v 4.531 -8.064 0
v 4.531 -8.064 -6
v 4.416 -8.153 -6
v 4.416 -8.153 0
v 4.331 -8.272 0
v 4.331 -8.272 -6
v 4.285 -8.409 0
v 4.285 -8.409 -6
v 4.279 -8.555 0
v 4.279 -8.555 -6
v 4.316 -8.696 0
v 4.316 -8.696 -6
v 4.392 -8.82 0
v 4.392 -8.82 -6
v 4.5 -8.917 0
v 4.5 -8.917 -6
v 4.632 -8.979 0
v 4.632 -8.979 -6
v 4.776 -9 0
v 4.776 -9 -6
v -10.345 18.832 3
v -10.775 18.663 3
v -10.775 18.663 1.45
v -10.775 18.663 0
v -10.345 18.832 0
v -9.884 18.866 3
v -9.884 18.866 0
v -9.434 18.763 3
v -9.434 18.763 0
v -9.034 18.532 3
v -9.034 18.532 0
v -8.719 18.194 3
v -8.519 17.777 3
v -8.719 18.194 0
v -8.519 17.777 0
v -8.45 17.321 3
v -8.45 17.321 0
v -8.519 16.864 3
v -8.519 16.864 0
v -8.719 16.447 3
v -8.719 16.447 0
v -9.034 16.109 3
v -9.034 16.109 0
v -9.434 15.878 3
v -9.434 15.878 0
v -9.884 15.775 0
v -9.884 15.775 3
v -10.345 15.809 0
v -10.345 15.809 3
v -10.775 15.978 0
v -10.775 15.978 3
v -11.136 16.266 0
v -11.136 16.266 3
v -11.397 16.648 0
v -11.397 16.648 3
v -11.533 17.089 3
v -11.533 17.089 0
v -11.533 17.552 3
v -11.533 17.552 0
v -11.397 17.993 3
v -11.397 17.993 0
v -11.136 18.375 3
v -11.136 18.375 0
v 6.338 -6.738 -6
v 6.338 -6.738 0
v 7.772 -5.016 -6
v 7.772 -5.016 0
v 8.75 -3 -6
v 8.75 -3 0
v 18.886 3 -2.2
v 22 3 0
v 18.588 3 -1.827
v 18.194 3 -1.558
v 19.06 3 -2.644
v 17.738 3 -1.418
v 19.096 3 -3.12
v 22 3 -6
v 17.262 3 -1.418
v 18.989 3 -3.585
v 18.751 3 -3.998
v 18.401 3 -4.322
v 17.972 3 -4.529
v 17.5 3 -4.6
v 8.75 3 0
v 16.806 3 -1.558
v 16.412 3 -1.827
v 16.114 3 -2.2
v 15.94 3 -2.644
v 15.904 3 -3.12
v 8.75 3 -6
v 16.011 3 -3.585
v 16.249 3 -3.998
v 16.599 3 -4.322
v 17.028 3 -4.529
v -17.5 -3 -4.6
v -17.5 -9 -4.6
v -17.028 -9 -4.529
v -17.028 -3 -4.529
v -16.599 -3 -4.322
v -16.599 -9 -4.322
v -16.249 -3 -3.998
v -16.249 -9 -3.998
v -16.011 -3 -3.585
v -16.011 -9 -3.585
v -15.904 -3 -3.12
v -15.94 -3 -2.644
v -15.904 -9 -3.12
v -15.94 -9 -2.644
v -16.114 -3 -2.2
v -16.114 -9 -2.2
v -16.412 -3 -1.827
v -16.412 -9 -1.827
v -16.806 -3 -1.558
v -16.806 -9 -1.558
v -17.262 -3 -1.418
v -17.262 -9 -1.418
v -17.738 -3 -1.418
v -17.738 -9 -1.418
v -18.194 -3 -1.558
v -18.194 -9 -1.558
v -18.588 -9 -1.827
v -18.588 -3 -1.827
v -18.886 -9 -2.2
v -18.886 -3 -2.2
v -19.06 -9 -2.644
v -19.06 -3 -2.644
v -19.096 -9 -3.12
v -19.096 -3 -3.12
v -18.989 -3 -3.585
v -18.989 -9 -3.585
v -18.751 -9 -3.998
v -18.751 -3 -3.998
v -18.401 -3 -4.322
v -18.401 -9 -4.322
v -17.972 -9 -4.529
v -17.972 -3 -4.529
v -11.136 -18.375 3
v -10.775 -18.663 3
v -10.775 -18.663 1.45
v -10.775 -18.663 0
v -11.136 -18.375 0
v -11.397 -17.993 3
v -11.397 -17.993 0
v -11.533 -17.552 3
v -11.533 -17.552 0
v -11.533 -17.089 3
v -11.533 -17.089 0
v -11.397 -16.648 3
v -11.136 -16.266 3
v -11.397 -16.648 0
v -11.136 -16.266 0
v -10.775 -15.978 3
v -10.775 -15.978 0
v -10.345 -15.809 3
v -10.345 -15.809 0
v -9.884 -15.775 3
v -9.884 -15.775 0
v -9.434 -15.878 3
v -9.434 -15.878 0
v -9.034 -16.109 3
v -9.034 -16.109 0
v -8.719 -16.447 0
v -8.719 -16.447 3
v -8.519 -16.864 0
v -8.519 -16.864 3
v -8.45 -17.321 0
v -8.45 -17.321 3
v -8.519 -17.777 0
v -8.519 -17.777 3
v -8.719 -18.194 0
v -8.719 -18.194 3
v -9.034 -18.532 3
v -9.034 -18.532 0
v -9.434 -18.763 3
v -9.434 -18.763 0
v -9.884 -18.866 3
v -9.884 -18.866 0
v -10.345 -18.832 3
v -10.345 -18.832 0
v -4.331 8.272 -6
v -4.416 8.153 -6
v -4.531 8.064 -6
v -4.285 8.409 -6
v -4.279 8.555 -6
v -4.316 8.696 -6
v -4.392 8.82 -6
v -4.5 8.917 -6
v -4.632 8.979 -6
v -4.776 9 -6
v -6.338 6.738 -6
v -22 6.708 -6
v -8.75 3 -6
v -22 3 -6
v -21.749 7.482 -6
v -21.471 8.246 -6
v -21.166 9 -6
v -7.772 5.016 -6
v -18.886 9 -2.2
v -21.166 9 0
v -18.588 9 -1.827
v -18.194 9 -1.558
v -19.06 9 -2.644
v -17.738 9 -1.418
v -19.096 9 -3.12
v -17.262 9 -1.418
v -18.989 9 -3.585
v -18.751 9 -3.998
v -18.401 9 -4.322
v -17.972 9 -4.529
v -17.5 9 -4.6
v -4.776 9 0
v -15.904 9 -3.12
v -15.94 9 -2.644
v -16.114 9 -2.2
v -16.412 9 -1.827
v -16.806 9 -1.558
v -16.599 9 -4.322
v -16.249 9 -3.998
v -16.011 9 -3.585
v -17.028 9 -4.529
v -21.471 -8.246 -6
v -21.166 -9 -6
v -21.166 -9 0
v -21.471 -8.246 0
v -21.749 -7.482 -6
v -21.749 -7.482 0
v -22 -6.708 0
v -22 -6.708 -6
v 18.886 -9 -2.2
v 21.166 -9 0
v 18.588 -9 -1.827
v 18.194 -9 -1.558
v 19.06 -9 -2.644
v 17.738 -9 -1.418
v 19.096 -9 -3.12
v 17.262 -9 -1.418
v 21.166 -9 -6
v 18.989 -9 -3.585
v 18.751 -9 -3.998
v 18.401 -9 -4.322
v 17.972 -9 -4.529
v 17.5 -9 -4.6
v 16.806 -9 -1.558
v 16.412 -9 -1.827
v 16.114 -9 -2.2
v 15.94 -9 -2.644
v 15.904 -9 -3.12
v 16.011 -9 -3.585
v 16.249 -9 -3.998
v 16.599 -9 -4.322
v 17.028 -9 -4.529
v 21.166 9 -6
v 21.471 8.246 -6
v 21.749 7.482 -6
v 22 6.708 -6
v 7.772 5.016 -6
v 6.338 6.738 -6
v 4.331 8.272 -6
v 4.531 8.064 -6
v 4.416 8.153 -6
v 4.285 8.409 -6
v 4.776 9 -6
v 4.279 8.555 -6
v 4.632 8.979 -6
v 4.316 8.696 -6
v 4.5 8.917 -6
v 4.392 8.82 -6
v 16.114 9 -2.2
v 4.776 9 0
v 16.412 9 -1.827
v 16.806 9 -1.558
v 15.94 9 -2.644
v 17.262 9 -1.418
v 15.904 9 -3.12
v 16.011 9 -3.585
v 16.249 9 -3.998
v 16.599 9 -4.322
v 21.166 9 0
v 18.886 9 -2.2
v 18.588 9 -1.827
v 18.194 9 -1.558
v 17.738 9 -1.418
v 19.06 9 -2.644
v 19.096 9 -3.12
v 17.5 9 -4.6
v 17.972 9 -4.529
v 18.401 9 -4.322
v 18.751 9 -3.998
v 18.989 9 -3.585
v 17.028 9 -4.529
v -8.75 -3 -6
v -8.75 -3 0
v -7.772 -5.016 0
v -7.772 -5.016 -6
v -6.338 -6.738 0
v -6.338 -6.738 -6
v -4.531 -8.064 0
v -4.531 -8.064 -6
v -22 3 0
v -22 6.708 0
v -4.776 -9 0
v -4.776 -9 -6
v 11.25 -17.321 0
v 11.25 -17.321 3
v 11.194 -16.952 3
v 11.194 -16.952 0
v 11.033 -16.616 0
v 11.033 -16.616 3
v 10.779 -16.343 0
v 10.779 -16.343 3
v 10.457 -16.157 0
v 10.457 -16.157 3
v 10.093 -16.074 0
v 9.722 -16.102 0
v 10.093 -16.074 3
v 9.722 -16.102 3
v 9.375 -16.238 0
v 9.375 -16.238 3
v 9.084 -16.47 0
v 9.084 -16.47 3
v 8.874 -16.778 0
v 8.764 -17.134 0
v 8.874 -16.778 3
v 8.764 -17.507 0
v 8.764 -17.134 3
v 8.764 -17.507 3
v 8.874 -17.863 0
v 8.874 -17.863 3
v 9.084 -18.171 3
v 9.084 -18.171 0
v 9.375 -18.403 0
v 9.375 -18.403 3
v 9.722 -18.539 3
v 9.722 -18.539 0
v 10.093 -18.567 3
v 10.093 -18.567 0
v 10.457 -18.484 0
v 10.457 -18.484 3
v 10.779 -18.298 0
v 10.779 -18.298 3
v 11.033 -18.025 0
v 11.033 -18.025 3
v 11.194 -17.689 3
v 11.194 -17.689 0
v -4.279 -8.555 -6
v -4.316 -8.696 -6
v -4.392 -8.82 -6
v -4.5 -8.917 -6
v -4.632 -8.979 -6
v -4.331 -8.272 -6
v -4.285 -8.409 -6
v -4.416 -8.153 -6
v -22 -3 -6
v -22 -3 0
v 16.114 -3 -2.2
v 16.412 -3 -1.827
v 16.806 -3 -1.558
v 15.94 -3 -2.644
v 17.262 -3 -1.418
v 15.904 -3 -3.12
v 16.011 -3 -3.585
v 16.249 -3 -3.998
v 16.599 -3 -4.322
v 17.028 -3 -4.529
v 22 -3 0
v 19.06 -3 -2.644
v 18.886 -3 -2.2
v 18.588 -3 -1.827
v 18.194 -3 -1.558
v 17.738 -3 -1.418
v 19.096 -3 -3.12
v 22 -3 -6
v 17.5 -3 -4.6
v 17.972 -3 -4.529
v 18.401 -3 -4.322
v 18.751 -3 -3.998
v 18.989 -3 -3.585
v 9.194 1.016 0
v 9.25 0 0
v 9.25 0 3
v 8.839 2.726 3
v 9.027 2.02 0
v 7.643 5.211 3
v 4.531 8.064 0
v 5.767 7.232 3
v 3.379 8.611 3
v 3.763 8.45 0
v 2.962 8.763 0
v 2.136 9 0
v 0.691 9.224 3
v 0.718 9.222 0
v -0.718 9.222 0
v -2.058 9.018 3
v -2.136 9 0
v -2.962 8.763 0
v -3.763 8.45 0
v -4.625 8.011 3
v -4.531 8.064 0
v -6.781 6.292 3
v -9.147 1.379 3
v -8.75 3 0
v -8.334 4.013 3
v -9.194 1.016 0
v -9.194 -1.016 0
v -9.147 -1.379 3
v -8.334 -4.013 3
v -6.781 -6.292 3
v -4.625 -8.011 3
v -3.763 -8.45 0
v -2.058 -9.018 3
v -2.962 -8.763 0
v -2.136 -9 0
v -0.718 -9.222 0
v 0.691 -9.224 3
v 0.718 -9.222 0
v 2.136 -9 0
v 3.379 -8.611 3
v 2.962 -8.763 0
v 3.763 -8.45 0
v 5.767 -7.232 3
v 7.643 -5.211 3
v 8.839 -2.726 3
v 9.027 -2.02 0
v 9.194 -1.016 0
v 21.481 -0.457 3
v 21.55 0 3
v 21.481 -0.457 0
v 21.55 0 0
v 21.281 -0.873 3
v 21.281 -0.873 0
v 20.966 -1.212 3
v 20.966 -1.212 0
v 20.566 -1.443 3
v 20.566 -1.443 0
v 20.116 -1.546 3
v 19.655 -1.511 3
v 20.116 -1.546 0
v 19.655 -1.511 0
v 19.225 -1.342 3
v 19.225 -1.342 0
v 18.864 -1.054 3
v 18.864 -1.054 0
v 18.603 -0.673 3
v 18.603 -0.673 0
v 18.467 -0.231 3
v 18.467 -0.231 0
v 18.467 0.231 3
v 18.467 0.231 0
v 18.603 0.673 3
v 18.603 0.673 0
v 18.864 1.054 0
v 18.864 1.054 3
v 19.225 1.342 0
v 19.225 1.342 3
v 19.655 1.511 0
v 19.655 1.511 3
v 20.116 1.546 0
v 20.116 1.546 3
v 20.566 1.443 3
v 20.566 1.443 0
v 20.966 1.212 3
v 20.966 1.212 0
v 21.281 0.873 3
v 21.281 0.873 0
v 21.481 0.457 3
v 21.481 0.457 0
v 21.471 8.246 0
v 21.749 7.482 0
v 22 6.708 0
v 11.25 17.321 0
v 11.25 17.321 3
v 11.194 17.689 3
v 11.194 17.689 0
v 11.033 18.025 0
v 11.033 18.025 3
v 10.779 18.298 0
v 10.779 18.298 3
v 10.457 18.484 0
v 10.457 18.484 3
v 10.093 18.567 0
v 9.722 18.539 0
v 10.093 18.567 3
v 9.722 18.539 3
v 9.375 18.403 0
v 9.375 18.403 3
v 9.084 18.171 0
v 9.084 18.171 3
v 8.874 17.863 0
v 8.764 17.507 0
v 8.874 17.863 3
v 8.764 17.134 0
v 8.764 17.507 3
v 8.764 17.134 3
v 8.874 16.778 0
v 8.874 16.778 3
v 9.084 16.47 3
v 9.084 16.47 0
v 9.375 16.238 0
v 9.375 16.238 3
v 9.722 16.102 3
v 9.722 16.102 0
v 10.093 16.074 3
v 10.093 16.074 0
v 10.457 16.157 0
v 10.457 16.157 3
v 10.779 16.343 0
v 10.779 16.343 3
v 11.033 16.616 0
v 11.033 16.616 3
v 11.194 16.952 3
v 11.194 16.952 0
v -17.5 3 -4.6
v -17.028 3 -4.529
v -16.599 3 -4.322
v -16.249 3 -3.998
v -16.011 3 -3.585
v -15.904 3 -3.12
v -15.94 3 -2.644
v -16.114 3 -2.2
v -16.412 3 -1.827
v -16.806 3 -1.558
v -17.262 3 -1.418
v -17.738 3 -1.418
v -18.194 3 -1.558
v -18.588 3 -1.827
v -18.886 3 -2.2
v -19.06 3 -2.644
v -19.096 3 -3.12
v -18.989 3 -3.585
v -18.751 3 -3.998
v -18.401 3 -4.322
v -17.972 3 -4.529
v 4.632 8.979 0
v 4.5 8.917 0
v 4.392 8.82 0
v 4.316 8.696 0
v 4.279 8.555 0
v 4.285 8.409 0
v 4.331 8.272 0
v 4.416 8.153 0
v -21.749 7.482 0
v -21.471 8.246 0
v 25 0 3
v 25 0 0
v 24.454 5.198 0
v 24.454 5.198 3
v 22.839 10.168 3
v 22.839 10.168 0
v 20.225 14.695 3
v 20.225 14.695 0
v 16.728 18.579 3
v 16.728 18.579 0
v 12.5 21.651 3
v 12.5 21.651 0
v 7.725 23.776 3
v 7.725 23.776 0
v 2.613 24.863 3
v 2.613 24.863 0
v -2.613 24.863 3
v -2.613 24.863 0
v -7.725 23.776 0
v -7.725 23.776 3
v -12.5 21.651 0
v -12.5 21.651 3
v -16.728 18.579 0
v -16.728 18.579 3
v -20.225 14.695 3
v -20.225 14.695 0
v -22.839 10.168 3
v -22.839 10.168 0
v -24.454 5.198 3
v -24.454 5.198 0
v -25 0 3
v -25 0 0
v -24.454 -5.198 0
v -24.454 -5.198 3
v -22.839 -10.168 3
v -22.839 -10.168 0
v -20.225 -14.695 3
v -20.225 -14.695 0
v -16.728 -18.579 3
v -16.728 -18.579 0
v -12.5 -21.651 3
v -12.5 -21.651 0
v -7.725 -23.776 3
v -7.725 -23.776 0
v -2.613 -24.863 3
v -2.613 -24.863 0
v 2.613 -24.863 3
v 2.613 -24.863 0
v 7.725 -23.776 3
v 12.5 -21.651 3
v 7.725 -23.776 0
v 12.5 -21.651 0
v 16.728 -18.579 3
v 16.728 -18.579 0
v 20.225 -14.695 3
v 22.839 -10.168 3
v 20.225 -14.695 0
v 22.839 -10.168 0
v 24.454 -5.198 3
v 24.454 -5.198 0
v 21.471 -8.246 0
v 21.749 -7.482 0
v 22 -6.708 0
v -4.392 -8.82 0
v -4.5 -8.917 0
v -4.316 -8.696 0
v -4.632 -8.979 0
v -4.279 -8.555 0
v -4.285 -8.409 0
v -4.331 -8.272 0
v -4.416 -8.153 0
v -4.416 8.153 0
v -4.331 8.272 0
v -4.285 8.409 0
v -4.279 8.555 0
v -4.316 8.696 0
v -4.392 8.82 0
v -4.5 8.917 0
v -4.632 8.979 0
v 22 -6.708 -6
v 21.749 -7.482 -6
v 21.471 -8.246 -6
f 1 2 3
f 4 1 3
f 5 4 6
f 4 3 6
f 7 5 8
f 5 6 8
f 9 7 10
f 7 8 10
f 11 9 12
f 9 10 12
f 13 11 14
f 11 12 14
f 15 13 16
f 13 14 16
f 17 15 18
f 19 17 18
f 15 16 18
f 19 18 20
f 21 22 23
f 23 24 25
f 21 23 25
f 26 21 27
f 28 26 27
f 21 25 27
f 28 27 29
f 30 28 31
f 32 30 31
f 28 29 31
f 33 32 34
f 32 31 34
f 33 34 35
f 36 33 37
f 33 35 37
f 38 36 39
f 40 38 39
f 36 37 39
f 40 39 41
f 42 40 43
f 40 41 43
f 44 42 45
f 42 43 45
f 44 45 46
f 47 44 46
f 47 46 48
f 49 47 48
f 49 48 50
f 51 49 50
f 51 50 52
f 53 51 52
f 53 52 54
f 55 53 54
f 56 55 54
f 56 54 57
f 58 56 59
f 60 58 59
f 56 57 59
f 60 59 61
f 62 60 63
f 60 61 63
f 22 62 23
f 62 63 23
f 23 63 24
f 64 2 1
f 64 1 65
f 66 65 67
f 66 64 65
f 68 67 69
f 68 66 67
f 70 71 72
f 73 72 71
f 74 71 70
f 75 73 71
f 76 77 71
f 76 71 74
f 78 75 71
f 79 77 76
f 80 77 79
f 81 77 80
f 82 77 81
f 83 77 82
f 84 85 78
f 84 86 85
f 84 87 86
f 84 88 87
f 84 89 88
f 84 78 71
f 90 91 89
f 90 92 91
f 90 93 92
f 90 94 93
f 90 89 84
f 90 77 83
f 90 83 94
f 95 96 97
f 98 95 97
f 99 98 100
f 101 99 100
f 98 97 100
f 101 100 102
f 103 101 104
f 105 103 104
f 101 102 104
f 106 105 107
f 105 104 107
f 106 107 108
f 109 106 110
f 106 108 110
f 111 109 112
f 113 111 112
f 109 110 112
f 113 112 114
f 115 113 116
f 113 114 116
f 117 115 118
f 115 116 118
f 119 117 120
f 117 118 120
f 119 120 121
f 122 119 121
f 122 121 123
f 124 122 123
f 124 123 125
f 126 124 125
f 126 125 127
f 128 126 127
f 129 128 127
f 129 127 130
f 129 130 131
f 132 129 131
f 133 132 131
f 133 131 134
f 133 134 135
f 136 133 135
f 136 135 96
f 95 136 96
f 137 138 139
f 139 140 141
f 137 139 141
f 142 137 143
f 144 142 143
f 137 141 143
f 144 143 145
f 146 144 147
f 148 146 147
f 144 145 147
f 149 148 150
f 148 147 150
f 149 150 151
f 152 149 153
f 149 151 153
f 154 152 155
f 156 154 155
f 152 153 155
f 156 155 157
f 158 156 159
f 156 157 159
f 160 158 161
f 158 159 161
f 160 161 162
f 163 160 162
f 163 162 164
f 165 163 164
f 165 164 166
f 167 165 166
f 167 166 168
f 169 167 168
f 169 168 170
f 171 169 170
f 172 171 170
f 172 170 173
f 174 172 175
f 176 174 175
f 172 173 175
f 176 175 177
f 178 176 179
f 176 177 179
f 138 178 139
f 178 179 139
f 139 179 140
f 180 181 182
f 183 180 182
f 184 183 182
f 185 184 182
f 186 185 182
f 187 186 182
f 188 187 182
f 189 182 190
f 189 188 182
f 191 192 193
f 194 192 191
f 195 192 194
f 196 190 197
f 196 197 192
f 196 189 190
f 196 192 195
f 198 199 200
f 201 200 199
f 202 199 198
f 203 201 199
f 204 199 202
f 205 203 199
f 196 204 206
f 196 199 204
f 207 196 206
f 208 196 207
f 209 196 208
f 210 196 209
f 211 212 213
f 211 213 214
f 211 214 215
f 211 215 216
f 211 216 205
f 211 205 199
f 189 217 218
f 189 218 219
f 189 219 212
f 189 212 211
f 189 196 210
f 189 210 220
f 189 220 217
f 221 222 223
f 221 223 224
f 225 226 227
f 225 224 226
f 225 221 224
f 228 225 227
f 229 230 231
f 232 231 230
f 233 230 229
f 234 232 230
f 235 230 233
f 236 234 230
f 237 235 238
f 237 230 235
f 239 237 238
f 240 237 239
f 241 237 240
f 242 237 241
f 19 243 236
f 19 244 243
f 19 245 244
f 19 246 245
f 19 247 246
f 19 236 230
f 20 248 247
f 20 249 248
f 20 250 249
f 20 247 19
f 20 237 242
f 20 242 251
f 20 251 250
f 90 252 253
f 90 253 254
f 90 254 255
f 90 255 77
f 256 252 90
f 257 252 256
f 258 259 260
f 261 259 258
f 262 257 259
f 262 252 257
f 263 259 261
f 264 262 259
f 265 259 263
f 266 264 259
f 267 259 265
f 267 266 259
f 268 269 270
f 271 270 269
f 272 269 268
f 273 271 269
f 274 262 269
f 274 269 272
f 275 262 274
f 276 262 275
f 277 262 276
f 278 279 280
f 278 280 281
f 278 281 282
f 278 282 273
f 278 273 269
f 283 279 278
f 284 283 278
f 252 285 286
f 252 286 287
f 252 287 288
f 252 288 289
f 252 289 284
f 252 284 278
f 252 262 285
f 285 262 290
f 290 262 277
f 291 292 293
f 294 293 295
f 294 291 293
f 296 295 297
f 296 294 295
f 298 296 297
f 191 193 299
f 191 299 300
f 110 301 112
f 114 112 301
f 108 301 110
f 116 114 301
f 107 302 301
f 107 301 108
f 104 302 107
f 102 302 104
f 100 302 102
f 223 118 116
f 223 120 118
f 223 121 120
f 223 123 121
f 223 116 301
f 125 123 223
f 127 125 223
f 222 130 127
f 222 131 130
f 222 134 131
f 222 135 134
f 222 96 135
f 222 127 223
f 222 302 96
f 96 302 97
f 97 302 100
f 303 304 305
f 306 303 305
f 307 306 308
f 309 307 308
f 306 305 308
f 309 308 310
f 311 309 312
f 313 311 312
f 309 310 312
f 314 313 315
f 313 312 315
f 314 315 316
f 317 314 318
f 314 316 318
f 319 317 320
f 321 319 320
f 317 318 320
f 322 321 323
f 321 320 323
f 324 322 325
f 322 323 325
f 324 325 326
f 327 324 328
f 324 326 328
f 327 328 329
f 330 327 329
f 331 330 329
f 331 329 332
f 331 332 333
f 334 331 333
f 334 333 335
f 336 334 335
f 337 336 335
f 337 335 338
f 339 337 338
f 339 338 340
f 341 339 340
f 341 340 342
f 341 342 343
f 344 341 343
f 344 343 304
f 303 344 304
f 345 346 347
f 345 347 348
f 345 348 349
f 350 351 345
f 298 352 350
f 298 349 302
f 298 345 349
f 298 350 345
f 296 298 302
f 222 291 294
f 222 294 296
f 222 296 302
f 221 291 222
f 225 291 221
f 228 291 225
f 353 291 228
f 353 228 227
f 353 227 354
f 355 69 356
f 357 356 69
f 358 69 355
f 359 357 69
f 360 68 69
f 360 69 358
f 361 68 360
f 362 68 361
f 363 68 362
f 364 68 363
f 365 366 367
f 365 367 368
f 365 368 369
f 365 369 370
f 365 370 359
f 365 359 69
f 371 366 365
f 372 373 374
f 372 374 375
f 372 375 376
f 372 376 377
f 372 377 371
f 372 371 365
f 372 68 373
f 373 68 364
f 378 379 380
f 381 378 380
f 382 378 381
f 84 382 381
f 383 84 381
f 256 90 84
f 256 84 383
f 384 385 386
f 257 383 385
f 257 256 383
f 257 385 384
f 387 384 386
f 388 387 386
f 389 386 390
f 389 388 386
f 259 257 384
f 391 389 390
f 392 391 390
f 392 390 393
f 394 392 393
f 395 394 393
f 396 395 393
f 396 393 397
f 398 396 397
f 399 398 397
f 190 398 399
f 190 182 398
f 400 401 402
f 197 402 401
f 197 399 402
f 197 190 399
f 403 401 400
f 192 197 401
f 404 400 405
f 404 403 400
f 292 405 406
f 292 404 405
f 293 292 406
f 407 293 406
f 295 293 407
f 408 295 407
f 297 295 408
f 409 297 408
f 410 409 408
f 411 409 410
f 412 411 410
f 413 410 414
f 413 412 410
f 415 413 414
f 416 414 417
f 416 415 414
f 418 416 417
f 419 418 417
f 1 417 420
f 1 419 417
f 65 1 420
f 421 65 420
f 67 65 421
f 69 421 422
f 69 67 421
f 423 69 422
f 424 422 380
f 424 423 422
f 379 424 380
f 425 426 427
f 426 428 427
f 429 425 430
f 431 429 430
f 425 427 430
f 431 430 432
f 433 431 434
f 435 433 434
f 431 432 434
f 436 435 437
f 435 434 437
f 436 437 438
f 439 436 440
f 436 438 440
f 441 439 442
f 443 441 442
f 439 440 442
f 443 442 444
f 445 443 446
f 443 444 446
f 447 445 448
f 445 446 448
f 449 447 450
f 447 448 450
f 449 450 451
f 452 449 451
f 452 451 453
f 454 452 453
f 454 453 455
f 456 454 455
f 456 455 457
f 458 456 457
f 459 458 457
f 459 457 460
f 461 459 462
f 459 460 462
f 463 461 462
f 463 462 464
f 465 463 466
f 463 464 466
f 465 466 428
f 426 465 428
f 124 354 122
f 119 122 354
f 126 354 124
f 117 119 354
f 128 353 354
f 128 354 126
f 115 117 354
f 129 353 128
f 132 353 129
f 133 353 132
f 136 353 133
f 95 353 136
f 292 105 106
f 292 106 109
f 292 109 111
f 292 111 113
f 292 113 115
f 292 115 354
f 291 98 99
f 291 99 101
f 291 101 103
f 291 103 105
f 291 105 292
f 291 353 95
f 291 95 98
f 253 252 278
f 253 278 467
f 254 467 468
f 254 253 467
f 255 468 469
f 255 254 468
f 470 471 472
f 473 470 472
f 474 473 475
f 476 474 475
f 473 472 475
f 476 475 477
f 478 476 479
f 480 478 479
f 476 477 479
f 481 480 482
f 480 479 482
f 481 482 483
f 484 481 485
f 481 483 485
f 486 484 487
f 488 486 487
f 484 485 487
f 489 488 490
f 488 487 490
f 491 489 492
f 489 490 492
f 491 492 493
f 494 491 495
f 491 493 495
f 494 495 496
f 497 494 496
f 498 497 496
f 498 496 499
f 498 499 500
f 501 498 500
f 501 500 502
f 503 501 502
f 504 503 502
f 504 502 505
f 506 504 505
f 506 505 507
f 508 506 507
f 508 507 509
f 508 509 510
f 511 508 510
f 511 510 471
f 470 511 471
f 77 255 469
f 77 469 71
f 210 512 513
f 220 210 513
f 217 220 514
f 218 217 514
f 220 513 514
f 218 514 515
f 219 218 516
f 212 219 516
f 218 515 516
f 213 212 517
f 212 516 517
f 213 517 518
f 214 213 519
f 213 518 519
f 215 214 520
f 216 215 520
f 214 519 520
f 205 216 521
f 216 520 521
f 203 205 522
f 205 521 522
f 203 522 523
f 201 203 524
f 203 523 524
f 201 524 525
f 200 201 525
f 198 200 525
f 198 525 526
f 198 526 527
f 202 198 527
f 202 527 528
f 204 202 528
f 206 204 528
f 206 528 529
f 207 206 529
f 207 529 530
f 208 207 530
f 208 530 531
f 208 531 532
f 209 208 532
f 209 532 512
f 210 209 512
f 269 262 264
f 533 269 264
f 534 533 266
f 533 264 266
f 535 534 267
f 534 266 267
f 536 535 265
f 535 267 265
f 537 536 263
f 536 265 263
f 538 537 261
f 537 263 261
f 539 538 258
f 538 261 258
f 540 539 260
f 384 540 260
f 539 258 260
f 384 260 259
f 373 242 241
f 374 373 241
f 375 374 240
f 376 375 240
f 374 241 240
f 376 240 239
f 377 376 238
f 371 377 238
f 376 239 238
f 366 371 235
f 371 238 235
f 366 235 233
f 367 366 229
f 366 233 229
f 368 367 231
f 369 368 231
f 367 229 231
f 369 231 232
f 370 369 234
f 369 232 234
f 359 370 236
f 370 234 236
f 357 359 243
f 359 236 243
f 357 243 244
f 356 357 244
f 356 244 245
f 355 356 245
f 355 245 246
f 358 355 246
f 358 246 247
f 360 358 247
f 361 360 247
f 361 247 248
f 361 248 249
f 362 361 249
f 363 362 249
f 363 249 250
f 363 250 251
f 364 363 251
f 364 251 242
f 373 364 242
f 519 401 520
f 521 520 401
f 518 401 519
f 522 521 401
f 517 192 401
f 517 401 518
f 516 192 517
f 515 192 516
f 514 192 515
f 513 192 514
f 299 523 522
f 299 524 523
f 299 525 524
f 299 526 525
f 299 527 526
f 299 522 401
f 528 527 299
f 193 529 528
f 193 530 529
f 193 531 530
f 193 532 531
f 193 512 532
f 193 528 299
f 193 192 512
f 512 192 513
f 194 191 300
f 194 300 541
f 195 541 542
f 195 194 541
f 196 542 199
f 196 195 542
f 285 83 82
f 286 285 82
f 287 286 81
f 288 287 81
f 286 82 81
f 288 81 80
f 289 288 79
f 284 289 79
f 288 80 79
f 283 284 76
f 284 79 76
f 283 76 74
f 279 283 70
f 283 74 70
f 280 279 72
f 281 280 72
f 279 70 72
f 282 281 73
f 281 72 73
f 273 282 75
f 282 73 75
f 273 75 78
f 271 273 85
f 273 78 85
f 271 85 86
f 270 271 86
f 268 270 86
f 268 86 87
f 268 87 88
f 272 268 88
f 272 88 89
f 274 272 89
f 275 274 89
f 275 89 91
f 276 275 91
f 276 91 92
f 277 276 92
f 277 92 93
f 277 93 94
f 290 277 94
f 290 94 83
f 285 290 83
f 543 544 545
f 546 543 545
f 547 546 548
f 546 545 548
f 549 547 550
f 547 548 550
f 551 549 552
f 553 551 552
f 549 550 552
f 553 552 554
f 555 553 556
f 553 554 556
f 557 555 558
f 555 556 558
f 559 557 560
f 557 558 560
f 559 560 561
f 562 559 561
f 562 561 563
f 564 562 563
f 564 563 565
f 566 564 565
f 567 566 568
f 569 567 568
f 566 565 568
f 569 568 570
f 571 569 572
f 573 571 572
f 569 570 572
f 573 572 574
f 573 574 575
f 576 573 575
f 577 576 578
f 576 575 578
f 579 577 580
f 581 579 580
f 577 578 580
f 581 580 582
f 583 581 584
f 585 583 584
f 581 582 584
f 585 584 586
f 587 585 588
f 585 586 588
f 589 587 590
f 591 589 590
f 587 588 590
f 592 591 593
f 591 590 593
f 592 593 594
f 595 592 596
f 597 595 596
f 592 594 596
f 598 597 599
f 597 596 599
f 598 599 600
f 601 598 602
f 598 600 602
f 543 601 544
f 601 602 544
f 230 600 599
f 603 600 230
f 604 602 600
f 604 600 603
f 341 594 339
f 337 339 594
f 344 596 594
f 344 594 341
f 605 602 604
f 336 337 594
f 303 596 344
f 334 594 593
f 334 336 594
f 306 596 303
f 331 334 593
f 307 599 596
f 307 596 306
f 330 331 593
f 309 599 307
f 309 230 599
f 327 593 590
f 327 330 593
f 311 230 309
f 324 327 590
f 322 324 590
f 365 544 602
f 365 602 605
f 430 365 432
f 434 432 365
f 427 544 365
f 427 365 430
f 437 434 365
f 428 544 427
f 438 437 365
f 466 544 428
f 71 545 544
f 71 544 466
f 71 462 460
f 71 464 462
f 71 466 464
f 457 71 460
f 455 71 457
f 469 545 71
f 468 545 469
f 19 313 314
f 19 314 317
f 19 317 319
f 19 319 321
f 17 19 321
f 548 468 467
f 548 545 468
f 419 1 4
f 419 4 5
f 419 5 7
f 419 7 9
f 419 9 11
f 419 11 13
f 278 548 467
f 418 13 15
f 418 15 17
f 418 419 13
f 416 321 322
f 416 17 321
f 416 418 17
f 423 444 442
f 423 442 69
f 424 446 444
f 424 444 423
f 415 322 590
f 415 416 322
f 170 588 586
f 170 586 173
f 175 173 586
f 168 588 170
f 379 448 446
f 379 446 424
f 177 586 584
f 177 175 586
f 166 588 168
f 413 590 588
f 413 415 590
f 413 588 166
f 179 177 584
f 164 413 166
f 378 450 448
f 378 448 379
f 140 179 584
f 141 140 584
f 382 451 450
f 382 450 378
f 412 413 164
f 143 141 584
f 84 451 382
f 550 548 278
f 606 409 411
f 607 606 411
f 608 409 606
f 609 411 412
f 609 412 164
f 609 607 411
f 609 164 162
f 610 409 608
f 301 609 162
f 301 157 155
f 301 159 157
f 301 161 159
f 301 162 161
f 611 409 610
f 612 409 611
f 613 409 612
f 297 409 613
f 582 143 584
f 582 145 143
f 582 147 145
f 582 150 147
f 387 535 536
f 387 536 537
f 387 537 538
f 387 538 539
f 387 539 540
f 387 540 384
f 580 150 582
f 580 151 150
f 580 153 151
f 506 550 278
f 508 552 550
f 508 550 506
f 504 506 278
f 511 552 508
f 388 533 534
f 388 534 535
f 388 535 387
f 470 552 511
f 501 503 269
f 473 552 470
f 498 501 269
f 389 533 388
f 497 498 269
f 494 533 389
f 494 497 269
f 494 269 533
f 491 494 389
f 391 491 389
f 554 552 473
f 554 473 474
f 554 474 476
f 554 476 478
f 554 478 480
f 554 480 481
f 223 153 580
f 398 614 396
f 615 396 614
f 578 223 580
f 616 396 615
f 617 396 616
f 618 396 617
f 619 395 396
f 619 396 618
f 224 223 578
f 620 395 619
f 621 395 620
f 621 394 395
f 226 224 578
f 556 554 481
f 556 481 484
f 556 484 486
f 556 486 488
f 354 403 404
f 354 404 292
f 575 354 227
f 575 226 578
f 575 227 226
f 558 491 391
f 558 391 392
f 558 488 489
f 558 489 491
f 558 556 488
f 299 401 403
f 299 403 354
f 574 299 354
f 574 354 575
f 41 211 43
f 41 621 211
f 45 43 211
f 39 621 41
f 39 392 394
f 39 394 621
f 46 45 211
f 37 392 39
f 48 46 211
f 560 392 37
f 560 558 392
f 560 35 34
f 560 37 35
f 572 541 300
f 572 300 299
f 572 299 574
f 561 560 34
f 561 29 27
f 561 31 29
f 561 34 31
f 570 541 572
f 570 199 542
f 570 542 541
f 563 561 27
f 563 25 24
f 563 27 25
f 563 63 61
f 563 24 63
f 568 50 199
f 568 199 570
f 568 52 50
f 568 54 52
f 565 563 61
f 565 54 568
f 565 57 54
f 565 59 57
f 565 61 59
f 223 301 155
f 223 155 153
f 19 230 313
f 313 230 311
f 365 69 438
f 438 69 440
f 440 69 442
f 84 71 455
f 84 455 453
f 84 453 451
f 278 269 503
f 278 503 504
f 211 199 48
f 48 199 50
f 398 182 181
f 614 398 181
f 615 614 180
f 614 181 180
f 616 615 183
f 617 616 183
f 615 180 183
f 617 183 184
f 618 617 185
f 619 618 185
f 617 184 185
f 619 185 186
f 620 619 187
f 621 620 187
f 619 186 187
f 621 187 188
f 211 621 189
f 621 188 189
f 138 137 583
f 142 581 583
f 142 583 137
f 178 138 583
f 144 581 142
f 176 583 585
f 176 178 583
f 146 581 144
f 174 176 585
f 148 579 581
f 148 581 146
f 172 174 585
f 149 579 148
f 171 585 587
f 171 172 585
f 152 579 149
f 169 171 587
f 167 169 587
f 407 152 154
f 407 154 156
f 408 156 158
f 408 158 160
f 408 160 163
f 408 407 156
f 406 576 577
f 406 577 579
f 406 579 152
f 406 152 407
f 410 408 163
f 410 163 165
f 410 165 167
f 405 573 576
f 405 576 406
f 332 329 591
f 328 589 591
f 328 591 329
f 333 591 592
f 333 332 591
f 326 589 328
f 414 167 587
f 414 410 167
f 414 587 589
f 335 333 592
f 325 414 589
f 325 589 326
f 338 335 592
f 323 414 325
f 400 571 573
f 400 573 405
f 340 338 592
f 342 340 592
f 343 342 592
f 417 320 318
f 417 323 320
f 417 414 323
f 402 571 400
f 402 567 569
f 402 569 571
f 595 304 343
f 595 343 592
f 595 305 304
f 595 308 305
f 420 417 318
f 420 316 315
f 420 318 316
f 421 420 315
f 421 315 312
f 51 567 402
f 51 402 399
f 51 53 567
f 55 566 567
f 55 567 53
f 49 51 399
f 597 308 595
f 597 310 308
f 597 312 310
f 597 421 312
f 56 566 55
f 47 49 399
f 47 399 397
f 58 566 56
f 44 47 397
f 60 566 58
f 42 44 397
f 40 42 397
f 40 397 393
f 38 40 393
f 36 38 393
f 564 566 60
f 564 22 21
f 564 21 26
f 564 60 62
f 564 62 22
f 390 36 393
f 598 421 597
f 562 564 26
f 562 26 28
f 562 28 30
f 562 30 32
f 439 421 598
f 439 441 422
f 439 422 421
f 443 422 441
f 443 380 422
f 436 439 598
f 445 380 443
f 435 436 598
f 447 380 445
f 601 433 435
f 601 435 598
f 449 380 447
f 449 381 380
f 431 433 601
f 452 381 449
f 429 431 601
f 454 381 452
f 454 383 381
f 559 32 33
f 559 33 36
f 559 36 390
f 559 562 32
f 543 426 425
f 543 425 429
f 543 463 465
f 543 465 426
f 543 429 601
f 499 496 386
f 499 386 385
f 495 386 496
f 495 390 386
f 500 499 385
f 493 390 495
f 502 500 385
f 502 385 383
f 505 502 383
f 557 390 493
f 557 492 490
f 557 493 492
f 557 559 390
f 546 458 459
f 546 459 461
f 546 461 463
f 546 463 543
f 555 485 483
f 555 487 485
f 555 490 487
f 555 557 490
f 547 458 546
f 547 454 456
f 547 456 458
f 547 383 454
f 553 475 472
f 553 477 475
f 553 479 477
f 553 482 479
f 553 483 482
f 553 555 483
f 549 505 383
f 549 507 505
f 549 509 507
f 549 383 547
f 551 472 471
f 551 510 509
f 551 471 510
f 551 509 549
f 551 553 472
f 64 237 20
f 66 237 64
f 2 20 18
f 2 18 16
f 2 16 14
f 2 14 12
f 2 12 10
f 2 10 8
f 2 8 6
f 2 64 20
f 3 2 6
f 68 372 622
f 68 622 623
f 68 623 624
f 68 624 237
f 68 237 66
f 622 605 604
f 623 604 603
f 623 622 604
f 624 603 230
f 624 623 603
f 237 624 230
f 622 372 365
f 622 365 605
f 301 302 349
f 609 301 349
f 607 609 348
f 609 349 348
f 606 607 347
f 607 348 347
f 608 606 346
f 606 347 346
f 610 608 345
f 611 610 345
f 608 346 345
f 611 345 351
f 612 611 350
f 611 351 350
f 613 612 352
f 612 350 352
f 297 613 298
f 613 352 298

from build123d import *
from build123d.topology import SkipClean

# Parameters (mm, degrees)
SKETCH_1_R               = 23
SKETCH_1_R_2             = 9.25
EXTRUDE_1_DEPTH          = 3
EXTRUDE_START            = 6
EXTRUDE_2_DEPTH          = 6
SKETCH_3_R               = 1.6
CUT_EXTRUDE_1_DEPTH      = 40.862262856
FILLET_3_R               = 0.5
SKETCH_4_R               = 25
SKETCH_4_R_2             = 23
CUT_EXTRUDE_2_DEPTH      = 10
SKETCH_5_R               = 25
SKETCH_5_R_2             = 9.25
EXTRUDE_3_DEPTH          = 3
PATTERN_CIRCULAR_1_COUNT = 3
SKETCH_12_R              = 3
SKETCH_12_R_2            = 1.55
EXTRUDE_4_DEPTH          = 2
HOLE_WIZARD_M3_1_D       = 2.5
HOLE_WIZARD_M3_1_DEPTH   = 12.5
HOLE_WIZARD_M3_1_TIP     = 0.751075774
SKETCH_16_R              = 3
SKETCH_16_R_2            = 1.55
EXTRUDE_5_DEPTH          = 3


with BuildPart() as part:
    # 草图1 → 凸台-拉伸1 (new body)
    with BuildSketch(Plane.XY):
        Circle(SKETCH_1_R)
        Circle(SKETCH_1_R_2, mode=Mode.SUBTRACT)
    extrude(amount=EXTRUDE_1_DEPTH)

    # 草图2 → 凸台-拉伸2 (add)
    with BuildSketch(Plane(origin=(0, 0, 0), x_dir=(-1, 0, 0), z_dir=(0, 0, -1)).offset(EXTRUDE_START)):
        with BuildLine():
            Line((22, 9), (2.136000936, 9))
            ThreePointArc((2.136000936, 9), (6.215002341, 6.851003277), (8.75, 3))
            Line((8.75, 3), (22, 3))
            Line((22, 3), (22, 9))
        make_face()
        with BuildLine():
            Line((-22, 9), (-22, 3))
            Line((-22, 3), (-8.75, 3))
            ThreePointArc((-8.75, 3), (-6.215002341, 6.851003277), (-2.136000936, 9))
            Line((-2.136000936, 9), (-22, 9))
        make_face()
        with BuildLine():
            Line((22, -3), (8.75, -3))
            ThreePointArc((8.75, -3), (6.215002341, -6.851003277), (2.136000936, -9))
            Line((2.136000936, -9), (22, -9))
            Line((22, -9), (22, -3))
        make_face()
        with BuildLine():
            Line((-22, -9), (-2.136000936, -9))
            ThreePointArc((-2.136000936, -9), (-6.215002341, -6.851003277), (-8.75, -3))
            Line((-8.75, -3), (-22, -3))
            Line((-22, -3), (-22, -9))
        make_face()
    extrude(amount=-EXTRUDE_2_DEPTH)

    # 草图3 → 切除-拉伸1 (cut, through all)
    with BuildSketch(Plane.XZ.offset(9)):
        with Locations(Location((-17.5, -3, 0), (0, 0, 270))):
            Circle(SKETCH_3_R)
        with Locations(Location((17.5, -3, 0), (0, 0, 270))):
            Circle(SKETCH_3_R)
    extrude(amount=-CUT_EXTRUDE_1_DEPTH, mode=Mode.SUBTRACT)

    # 圆角3
    # the kernel refuses this fillet: 0.5 mm, written as the material it takes off along each edge
    with BuildSketch(Plane(origin=(2.136000936, 9, -12.600605893), x_dir=(0.9314269408293101, -0.36392836368899956, 0), z_dir=(0, 0, 1))) as fillet_3_piece_1:
        with BuildLine():
            CenterArc((2.641157044, 0.49514561), FILLET_3_R, 111.34164725, 150.667889832)
            Line((2.459192862, 0.960859081), (0, 0))
            ThreePointArc((0, 0), (1.285826456, 0.089806207), (2.571652911, 0))
        make_face()
    extrude(amount=12.600605893, mode=Mode.SUBTRACT)
    with BuildSketch(Plane(origin=(-2.136000936, 9, -12.600605893), x_dir=(-0.931426940829308, -0.3639283636890051, 0), z_dir=(0, 0, 1))) as fillet_3_piece_2:
        with BuildLine():
            CenterArc((2.641157044, -0.49514561), FILLET_3_R, 97.990462918, 150.667889832)
            Line((2.459192862, -0.960859081), (0, 0))
            ThreePointArc((0, 0), (1.285826456, -0.089806207), (2.571652911, 0))
        make_face()
    extrude(amount=12.600605893, mode=Mode.SUBTRACT)
    with BuildSketch(Plane(origin=(-2.136000936, -9, -12.600605893), x_dir=(-1, 0, 0), z_dir=(0, 0, 1))) as fillet_3_piece_3:
        with BuildLine():
            CenterArc((2.640242357, -0.5), FILLET_3_R, 90, 150.667889832)
            ThreePointArc((2.395306804, -0.935897436), (1.230336428, -0.384300797), (0, 0))
            Line((0, 0), (2.640242357, 0))
        make_face()
    extrude(amount=12.600605893, mode=Mode.SUBTRACT)
    with BuildSketch(Plane(origin=(2.136000936, -9, -12.600605893), x_dir=(1, 0, 0), z_dir=(0, 0, 1))) as fillet_3_piece_4:
        with BuildLine():
            CenterArc((2.640242357, 0.5), FILLET_3_R, 119.332110168, 150.667889832)
            ThreePointArc((2.395306804, 0.935897436), (1.230336428, 0.384300797), (0, 0))
            Line((0, 0), (2.640242357, 0))
        make_face()
    extrude(amount=12.600605893, mode=Mode.SUBTRACT)

    # 草图4 → 切除-拉伸2 (cut)
    with SkipClean():  # the faces are left unmerged after this step: merging them gives an invalid solid
        with BuildSketch(Plane(origin=(0, 0, -6), x_dir=(-1, 0, 0), z_dir=(0, 0, -1))):
            Circle(SKETCH_4_R)
            with Locations(Location((0, 0, 0), (0, 0, 16.957426294))):
                Circle(SKETCH_4_R_2, mode=Mode.SUBTRACT)
        extrude(amount=-CUT_EXTRUDE_2_DEPTH, mode=Mode.SUBTRACT)
    add(part.part.scale(1), mode=Mode.REPLACE)  # the faces are merged on a copy

    # 草图5 → 凸台-拉伸3 (add)
    with SkipClean():  # the faces are left unmerged after this step: merging them gives an invalid solid
        with BuildSketch(Plane.XY):
            Circle(SKETCH_5_R)
            with Locations(Location((0, 0, 0), (0, 0, 198.924644416))):
                Circle(SKETCH_5_R_2, mode=Mode.SUBTRACT)
        extrude(amount=EXTRUDE_3_DEPTH)
    add(part.part.scale(1), mode=Mode.REPLACE)  # the faces are merged on a copy

    # 草图11 → 切除-旋转1 (revolve, cut)
    with BuildSketch(Plane(origin=(0, 0, 0), x_dir=(1, 0, 0), z_dir=(0, 1, 0))):
        Polygon((21.55, -3), (21.55, -1.45), (23, 0), (20, 0), (20, -3), align=None)
    cut_revolve_1 = revolve(axis=Axis((20, 0, 8.062210134), (0, 0, -1)), mode=Mode.SUBTRACT)

    # 阵列(圆周)1: 切除-旋转1 ×3 about axis
    pattern_circular_1_axis = Axis((0, 0, 0), (0, 0, 1))
    for i in range(1, PATTERN_CIRCULAR_1_COUNT):
        add(cut_revolve_1.rotate(pattern_circular_1_axis, i * 360 / PATTERN_CIRCULAR_1_COUNT), mode=Mode.SUBTRACT)

    # 草图12 → 凸台-拉伸4 (add)
    # profile 1 of 2: a face of its own
    with BuildSketch(Plane(origin=(0, 0, 0), x_dir=(-1, 0, 0), z_dir=(0, 0, -1))):
        with Locations((10, 17.320508076)):
            Circle(SKETCH_12_R)
        with Locations(Location((10, 17.320508076, 0), (0, 0, 60))):
            Circle(SKETCH_12_R_2, mode=Mode.SUBTRACT)
    # profile 2 of 2: a face of its own
    with BuildSketch(Plane(origin=(0, 0, 0), x_dir=(-1, 0, 0), z_dir=(0, 0, -1))):
        with Locations((10, -17.320508076)):
            Circle(SKETCH_12_R)
        with Locations(Location((10, -17.320508076, 0), (0, 0, 300))):
            Circle(SKETCH_12_R_2, mode=Mode.SUBTRACT)
    extrude(amount=-EXTRUDE_4_DEPTH)

    # M3 螺纹孔1
    with Locations(Plane(origin=(0, 0, 0), x_dir=(-1, 0, 0), z_dir=(0, 0, -1))):
        with Locations((-10, 17.320508076), (-10, -17.320508076)):
            Hole(HOLE_WIZARD_M3_1_D / 2, depth=HOLE_WIZARD_M3_1_DEPTH)
            with Locations((0, 0, -(HOLE_WIZARD_M3_1_DEPTH + HOLE_WIZARD_M3_1_TIP / 2))):  # 118° drill point
                Cone(0, HOLE_WIZARD_M3_1_D / 2, HOLE_WIZARD_M3_1_TIP, mode=Mode.SUBTRACT)

    # 草图16 → 凸台-拉伸5 (add)
    with BuildSketch(Plane(origin=(0, 0, 0), x_dir=(-1, 0, 0), z_dir=(0, 0, -1))):
        with Locations((-20, 0)):
            Circle(SKETCH_16_R)
        with Locations(Location((-20, 0, 0), (0, 0, 180))):
            Circle(SKETCH_16_R_2, mode=Mode.SUBTRACT)
    extrude(amount=-EXTRUDE_5_DEPTH)


solid = part.part
